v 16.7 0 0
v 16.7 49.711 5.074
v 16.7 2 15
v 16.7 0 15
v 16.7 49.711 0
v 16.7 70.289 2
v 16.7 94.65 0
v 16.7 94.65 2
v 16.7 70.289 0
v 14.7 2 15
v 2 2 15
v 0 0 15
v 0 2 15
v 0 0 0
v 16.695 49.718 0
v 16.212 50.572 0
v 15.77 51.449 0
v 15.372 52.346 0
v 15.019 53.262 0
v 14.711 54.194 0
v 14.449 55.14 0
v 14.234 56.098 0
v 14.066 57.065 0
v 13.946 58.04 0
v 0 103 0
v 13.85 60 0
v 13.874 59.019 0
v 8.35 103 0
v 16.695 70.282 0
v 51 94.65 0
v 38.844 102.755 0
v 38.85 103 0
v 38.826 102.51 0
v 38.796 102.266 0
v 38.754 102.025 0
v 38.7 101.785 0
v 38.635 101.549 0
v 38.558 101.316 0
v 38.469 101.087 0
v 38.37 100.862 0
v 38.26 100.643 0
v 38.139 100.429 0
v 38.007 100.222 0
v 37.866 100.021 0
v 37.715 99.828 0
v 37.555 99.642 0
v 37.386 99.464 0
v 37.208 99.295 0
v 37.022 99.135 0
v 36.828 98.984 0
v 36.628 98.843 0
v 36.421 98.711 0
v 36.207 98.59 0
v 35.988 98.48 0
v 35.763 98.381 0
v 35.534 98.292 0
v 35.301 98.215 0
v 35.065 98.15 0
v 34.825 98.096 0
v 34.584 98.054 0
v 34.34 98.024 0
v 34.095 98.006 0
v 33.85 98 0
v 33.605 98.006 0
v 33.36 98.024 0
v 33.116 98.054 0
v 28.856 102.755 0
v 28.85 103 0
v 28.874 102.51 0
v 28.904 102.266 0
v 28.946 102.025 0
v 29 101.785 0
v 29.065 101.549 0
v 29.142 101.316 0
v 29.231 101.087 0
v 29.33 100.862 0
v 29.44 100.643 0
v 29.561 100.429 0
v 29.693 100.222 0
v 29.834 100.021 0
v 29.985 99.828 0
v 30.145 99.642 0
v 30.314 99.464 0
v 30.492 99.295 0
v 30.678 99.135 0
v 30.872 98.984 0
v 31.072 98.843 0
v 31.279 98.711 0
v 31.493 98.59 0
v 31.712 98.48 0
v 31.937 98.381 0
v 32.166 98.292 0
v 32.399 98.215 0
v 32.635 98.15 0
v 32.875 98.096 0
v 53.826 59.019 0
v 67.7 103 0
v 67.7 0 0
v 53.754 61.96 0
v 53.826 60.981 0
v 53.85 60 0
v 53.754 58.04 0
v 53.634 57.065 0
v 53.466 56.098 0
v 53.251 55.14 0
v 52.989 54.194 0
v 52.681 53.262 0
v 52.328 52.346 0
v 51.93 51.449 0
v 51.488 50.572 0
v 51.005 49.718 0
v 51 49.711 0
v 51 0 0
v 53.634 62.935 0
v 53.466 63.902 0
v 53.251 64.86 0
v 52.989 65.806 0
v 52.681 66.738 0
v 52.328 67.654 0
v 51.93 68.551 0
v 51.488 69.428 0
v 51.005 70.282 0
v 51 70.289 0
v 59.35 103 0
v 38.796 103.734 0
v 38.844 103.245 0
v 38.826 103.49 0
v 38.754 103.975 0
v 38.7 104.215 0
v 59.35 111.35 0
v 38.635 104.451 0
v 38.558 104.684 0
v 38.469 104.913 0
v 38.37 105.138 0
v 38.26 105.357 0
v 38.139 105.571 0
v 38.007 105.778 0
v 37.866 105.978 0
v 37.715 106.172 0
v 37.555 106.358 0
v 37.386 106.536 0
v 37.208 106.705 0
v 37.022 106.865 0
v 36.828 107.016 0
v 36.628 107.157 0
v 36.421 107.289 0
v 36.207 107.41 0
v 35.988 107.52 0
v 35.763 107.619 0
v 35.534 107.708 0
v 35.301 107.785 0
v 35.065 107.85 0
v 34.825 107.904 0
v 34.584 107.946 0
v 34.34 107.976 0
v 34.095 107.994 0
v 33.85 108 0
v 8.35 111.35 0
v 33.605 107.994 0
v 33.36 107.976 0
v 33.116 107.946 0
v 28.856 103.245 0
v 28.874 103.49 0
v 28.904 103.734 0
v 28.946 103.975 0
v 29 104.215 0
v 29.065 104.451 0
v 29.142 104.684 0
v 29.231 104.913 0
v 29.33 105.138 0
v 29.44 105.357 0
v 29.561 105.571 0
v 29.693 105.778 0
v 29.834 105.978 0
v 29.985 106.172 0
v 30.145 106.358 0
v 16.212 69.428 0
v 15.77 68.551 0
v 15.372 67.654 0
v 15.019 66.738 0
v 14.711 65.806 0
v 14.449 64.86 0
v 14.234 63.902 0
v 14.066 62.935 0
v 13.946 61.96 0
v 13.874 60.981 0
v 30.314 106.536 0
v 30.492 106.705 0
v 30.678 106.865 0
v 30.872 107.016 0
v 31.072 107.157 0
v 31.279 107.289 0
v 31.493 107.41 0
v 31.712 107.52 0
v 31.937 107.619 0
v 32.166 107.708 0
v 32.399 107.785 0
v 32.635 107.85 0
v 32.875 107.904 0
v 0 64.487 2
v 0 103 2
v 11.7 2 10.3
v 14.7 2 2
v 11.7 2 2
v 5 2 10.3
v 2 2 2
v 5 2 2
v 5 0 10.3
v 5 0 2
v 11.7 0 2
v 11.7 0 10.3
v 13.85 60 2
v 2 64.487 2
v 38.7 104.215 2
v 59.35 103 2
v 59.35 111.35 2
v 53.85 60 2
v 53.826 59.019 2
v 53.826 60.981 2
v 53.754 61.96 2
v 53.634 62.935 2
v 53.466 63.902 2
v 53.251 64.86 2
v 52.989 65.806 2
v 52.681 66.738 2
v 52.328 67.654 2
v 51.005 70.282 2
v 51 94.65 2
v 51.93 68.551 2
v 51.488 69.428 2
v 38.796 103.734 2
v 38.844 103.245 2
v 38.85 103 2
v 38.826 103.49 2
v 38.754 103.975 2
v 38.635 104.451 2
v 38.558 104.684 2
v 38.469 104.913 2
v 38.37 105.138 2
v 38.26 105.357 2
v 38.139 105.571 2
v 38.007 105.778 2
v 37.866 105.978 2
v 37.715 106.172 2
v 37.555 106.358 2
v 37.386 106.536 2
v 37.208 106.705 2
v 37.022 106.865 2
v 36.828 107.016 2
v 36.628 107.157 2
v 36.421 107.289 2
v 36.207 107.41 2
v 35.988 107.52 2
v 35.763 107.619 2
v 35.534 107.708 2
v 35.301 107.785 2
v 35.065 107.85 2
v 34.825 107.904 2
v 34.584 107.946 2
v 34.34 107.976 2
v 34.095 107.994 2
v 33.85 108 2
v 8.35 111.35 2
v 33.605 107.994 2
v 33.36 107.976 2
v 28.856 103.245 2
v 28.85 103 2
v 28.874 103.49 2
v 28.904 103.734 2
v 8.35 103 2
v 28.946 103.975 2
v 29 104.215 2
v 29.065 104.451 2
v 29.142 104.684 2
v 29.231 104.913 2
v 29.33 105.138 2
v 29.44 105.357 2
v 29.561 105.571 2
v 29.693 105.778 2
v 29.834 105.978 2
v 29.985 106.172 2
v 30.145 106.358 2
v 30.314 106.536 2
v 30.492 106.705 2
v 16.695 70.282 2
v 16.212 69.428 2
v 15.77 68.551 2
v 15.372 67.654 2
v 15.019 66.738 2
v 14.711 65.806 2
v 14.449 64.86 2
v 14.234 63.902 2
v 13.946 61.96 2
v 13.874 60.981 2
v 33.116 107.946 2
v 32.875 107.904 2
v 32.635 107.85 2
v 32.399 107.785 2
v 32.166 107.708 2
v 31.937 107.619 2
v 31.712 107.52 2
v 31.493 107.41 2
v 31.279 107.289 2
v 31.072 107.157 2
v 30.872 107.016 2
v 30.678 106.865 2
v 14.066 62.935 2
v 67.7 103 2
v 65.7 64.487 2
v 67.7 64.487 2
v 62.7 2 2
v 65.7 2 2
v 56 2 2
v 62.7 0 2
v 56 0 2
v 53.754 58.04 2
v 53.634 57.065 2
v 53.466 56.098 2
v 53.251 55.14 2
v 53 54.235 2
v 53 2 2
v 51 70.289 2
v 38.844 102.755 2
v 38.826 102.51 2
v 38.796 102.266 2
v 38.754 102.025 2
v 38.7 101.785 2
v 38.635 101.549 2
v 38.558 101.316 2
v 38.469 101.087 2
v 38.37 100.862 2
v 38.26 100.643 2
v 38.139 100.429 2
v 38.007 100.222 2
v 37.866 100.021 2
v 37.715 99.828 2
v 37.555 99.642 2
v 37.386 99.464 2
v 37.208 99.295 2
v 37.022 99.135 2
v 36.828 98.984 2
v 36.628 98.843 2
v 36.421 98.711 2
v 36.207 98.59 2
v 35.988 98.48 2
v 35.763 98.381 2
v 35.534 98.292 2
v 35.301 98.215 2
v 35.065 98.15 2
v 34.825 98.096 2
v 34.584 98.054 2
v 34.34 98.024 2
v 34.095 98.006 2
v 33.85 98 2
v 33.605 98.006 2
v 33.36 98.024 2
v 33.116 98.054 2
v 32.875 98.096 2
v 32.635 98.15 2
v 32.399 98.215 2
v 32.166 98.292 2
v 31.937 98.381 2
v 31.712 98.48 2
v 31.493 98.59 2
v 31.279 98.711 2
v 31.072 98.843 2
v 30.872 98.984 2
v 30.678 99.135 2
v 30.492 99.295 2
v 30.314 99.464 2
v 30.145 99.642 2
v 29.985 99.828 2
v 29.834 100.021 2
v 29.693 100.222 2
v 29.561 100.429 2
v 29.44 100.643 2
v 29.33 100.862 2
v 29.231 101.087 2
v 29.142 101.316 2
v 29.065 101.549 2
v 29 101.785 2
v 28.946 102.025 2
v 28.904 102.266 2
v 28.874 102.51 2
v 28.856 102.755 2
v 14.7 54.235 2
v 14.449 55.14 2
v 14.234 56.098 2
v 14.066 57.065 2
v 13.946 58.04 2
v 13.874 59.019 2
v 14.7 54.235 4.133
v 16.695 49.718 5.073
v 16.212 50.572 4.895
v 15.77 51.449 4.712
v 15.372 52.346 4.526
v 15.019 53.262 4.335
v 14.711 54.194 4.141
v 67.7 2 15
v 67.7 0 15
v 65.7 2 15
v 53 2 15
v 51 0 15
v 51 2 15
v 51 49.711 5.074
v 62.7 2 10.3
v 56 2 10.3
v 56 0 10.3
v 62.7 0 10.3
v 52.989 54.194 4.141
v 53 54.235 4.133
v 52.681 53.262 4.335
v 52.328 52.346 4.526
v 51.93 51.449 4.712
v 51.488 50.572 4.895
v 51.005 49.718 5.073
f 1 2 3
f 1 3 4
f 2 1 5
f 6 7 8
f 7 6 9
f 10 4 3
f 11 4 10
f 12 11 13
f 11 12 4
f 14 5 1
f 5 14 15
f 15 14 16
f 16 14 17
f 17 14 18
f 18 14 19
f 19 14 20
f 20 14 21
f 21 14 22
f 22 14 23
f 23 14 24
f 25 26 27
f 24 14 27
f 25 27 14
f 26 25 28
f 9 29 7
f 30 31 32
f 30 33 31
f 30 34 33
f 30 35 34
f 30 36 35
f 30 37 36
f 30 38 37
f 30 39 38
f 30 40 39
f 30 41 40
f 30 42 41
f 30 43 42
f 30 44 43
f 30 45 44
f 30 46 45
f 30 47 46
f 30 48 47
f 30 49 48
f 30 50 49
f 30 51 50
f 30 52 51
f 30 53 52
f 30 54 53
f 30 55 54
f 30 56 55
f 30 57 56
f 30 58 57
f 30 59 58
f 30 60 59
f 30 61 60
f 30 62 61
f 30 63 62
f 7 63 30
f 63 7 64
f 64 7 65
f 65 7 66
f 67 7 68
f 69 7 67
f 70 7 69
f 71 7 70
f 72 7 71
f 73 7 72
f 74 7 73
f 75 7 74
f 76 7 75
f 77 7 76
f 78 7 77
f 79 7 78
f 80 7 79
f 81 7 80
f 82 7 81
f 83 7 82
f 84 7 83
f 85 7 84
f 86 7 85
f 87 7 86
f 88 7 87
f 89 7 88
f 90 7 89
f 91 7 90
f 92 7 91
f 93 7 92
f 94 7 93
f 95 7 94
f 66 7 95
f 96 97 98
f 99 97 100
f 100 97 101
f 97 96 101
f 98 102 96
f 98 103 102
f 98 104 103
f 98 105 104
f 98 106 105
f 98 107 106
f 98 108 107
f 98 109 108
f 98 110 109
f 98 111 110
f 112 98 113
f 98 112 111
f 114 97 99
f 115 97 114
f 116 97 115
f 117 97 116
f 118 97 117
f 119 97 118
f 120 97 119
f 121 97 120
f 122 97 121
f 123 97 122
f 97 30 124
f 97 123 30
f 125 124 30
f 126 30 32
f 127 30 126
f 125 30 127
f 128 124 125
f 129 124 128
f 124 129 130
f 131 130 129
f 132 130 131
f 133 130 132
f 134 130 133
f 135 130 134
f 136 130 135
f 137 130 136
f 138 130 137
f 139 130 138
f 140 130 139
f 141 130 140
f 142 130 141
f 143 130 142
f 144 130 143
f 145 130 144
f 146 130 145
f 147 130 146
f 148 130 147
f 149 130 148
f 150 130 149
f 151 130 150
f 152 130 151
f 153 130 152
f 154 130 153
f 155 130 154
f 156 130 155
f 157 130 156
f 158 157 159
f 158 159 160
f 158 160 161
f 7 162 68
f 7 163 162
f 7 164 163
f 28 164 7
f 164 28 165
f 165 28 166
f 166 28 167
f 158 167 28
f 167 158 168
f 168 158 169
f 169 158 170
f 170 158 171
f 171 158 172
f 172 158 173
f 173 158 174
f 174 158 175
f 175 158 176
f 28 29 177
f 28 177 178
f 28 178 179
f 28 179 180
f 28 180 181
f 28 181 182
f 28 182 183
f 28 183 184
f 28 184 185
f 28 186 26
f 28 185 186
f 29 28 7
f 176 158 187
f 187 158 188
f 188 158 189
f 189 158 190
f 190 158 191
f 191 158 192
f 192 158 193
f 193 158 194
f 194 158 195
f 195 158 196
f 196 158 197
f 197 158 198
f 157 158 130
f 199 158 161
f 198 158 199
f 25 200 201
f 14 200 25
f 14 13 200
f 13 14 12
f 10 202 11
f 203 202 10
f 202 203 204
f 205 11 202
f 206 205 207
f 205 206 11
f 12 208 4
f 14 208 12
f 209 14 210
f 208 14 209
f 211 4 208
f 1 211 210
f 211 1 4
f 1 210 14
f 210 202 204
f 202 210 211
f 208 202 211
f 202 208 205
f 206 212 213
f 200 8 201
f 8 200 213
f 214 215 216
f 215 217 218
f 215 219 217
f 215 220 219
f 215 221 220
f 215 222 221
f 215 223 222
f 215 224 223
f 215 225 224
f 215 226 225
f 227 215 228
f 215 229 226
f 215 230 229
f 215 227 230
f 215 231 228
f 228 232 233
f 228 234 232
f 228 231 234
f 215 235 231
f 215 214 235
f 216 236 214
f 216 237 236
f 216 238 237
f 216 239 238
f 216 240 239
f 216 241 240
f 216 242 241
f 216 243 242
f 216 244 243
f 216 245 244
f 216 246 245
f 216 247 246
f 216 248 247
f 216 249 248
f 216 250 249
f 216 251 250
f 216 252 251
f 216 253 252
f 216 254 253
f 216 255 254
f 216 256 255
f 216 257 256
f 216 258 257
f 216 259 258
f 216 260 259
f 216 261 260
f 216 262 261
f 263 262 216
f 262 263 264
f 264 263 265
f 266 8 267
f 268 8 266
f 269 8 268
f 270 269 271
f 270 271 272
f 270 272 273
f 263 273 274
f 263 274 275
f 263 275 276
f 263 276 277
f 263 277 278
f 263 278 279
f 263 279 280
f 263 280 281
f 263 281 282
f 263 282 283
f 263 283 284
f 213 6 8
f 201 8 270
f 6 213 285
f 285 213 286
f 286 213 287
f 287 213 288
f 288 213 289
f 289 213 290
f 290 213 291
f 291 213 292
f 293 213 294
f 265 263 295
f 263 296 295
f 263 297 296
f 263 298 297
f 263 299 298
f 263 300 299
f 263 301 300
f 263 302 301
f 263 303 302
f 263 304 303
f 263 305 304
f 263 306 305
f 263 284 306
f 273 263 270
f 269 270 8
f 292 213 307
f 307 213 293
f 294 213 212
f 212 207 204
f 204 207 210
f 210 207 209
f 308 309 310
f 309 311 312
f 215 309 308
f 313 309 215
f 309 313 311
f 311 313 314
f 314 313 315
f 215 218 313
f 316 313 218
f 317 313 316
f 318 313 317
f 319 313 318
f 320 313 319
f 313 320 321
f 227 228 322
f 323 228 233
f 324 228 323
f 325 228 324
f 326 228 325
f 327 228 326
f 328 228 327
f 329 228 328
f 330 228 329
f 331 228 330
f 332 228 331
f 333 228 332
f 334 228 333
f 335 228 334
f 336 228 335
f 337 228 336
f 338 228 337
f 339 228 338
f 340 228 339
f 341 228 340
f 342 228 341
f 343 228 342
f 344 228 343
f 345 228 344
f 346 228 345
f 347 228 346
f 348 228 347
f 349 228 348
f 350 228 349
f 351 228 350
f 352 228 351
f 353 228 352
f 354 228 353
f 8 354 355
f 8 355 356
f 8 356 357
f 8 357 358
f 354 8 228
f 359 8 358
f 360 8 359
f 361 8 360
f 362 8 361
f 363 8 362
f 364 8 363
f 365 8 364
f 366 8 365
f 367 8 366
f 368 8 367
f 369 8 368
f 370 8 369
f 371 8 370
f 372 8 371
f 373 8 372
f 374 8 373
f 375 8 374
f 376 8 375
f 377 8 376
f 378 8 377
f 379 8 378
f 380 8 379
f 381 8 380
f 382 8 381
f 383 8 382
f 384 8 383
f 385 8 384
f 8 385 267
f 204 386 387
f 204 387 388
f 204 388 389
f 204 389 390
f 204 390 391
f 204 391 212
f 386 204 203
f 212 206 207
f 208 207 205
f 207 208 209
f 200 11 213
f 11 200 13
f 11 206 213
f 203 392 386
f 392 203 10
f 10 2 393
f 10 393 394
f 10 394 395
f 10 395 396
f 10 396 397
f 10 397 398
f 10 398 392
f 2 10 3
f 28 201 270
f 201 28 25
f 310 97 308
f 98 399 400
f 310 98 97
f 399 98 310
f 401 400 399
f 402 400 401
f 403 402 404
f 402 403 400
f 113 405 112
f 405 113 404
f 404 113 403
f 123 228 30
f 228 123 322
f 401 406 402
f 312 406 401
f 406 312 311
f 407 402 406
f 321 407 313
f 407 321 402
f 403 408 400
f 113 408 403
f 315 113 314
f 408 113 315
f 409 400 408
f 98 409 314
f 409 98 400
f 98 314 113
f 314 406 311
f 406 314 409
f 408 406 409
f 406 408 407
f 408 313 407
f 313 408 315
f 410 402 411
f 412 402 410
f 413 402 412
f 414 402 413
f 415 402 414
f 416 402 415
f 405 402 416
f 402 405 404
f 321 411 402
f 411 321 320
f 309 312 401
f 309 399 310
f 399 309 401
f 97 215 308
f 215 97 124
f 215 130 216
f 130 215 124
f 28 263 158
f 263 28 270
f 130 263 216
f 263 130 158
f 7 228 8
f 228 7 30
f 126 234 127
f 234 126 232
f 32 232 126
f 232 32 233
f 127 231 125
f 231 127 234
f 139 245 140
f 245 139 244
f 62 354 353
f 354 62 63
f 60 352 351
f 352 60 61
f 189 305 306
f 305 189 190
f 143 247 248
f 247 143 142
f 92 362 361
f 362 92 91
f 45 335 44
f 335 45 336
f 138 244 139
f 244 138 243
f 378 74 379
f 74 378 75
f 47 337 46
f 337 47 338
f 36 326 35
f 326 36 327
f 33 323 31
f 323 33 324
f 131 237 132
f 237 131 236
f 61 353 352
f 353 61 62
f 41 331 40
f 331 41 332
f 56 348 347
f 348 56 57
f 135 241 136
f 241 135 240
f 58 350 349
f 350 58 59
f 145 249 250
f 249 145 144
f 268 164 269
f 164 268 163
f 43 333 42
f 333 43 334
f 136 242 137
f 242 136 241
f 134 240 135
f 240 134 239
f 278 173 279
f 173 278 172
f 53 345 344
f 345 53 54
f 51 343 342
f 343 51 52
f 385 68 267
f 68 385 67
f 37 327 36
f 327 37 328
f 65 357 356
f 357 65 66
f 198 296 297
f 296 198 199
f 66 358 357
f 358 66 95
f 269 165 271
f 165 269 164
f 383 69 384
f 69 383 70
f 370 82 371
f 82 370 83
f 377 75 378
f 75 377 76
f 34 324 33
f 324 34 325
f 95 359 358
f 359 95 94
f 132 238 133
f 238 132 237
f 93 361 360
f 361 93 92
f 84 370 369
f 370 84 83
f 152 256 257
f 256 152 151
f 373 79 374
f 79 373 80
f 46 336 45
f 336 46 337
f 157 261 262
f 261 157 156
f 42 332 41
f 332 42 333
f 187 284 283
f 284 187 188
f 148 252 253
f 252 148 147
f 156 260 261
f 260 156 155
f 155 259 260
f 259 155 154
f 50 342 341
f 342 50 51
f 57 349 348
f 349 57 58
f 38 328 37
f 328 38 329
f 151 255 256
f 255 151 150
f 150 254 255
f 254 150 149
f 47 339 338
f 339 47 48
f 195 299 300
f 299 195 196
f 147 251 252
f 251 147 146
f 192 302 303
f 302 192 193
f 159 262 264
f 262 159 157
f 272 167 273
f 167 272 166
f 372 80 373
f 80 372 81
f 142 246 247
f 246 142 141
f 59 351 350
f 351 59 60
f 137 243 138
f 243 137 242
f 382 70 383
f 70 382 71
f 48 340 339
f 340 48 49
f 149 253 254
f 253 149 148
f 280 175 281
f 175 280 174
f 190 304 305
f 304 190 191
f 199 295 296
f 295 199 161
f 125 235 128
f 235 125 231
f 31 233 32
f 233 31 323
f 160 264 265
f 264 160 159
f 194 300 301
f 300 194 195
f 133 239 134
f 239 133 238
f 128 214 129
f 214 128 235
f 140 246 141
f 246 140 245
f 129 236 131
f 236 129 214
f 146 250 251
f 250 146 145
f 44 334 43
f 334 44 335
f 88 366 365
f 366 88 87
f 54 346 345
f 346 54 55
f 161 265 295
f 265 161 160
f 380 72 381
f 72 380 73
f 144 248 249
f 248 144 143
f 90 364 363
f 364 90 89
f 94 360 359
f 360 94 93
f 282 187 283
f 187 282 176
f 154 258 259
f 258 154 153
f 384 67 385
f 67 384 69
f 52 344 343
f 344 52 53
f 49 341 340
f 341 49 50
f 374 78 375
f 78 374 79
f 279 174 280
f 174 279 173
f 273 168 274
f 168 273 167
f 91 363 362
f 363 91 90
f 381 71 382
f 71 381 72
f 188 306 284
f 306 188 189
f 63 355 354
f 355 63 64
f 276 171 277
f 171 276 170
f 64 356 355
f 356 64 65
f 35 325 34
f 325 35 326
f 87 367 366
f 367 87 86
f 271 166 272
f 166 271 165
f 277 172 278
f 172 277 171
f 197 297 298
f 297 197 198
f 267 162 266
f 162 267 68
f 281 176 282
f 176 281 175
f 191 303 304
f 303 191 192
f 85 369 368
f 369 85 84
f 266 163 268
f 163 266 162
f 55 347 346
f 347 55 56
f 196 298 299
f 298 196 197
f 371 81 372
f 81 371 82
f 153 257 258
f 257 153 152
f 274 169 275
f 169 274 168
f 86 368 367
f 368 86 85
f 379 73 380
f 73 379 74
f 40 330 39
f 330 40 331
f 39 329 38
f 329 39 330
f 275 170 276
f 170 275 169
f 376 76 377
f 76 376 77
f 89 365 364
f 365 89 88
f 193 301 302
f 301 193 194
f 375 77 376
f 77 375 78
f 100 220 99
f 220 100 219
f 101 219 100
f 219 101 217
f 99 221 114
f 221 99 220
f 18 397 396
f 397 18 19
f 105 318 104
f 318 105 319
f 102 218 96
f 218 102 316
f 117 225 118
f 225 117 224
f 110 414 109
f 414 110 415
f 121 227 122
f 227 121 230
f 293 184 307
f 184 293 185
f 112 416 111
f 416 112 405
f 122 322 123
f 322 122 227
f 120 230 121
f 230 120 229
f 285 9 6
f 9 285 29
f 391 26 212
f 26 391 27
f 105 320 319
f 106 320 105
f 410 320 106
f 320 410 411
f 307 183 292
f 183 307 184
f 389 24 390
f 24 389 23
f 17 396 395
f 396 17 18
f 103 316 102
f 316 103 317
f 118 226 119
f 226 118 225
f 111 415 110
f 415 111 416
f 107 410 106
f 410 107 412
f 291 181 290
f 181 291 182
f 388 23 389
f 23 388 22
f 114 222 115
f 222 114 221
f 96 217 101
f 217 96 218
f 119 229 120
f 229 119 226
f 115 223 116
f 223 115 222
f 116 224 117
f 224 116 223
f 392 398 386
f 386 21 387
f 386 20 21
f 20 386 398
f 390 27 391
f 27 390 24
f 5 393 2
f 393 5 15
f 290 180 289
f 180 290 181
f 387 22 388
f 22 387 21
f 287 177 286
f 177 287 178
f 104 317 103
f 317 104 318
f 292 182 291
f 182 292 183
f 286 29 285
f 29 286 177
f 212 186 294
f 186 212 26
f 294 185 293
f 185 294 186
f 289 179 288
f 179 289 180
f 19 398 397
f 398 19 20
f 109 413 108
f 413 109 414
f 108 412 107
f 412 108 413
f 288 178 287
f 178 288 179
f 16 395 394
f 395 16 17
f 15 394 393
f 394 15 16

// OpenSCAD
// file: common/prism.scad
// https://en.wikibooks.org/wiki/OpenSCAD_User_Manual/The_OpenSCAD_Language#polyhedron
module prism(l, w, h){
   polyhedron(
           points=[[0,0,0], [l,0,0], [l,w,0], [0,w,0], [0,w,h], [l,w,h]],
           faces=[[0,1,2,3],[5,4,3,2],[0,4,5,1],[0,3,4],[5,2,1]]
           );
}
// main file
use <common/prism.scad>

fn = 128;

// Hole width: 6.7mm
// Outer end-to-end: 57.5
// Inner end-to-end: 44.3
//
// Wheel outer radius: 1.9" (48.26 mm)
// Wheel inner radius: 1.325" (33.655mm)

margin = 10;
thickness = 2;
shim = 0.1;
hole_width = 6.7;
support_flange = 5;
base_to_center = 60;
center_to_chop = 43;
support_width = hole_width + support_flange*2;
support_length = base_to_center + center_to_chop;
support_height = 15;
inner_end_to_end = 44.3;
outer_end_to_end = 57.5;
hole_to_hole = inner_end_to_end+hole_width;
aperture_radius = 10 / 2;
wheel_center_offset = 60;
inner_wheel_radius = 40 / 2;
prism_length = support_length * 0.70;

module rotated_prism() {
  rotate(a=180, v=[0, 0, 1]) 
  prism(thickness, prism_length, support_height);
}

module support_module() {
  union() {
    translate([thickness, prism_length+thickness, 0])
    rotated_prism();
    translate([support_width, prism_length+thickness, 0])
    rotated_prism();
    cube([support_width, support_length, thickness]);
    difference() {
      cube([support_width, thickness, support_height]);
      translate([support_flange, 0, thickness])
      cube([hole_width, thickness, support_height-hole_width]);
    }
  }
}

module probe_module() {
  difference() {
    cube([hole_to_hole, support_width, thickness]);
    translate([hole_to_hole/2, support_width/2, -thickness])
    cylinder(thickness*3,
             aperture_radius,
             aperture_radius, $fn=fn);
  }
}

module render() {
  difference() {
    union() {
      echo(hole_to_hole=hole_to_hole);
      support_module();
      translate([hole_to_hole , 0, 0])
      support_module();
      translate([support_width/2, support_length - support_width/2, 0])
      probe_module();
    }
    translate([hole_to_hole/2 + support_width/2, wheel_center_offset, 0])
    cylinder(thickness*3,
             inner_wheel_radius,
             inner_wheel_radius, $fn=fn);
  }
}

echo(version=version());

render();
